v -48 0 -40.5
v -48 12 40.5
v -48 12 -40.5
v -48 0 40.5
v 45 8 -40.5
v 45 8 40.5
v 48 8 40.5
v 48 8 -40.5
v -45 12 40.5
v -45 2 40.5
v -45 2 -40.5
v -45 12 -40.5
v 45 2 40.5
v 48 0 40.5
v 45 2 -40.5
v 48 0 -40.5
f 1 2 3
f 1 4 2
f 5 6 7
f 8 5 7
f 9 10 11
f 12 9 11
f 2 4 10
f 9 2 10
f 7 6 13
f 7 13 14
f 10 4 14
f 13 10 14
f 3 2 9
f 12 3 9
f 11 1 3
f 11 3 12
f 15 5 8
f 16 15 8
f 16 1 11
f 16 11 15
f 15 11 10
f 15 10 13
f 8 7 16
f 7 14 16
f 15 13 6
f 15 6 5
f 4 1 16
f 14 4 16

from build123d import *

# Parameters (mm, degrees)
SK_P01_TRAY_W      = 96
SK_P01_TRAY_H      = 81
P01_TRAY_DEPTH     = 2
P02_REARSTOP_START = 2
SK_P02_REARSTOP_W  = 3
SK_P02_REARSTOP_H  = 81
P02_REARSTOP_DEPTH = 10
P03_FRONTLIP_START = 2
SK_P03_FRONTLIP_W  = 3
SK_P03_FRONTLIP_H  = 81
P03_FRONTLIP_DEPTH = 6


with BuildPart() as part:
    # SK_P01_Tray → P01_Tray (new body)
    with BuildSketch(Plane(origin=(0, 0, 0), x_dir=(1, 0, 0), z_dir=(0, 1, 0))):
        Rectangle(SK_P01_TRAY_W, SK_P01_TRAY_H)
    extrude(amount=P01_TRAY_DEPTH)

    # SK_P02_Rearstop → P02_Rearstop (add)
    with BuildSketch(Plane(origin=(0, 0, 0), x_dir=(1, 0, 0), z_dir=(0, 1, 0)).offset(P02_REARSTOP_START)):
        with Locations((-46.5, 0)):
            Rectangle(SK_P02_REARSTOP_W, SK_P02_REARSTOP_H)
    extrude(amount=P02_REARSTOP_DEPTH)

    # SK_P03_Frontlip → P03_Frontlip (add)
    with BuildSketch(Plane(origin=(0, 0, 0), x_dir=(1, 0, 0), z_dir=(0, 1, 0)).offset(P03_FRONTLIP_START)):
        with Locations((46.5, 0)):
            Rectangle(SK_P03_FRONTLIP_W, SK_P03_FRONTLIP_H)
    extrude(amount=P03_FRONTLIP_DEPTH)


solid = part.part
